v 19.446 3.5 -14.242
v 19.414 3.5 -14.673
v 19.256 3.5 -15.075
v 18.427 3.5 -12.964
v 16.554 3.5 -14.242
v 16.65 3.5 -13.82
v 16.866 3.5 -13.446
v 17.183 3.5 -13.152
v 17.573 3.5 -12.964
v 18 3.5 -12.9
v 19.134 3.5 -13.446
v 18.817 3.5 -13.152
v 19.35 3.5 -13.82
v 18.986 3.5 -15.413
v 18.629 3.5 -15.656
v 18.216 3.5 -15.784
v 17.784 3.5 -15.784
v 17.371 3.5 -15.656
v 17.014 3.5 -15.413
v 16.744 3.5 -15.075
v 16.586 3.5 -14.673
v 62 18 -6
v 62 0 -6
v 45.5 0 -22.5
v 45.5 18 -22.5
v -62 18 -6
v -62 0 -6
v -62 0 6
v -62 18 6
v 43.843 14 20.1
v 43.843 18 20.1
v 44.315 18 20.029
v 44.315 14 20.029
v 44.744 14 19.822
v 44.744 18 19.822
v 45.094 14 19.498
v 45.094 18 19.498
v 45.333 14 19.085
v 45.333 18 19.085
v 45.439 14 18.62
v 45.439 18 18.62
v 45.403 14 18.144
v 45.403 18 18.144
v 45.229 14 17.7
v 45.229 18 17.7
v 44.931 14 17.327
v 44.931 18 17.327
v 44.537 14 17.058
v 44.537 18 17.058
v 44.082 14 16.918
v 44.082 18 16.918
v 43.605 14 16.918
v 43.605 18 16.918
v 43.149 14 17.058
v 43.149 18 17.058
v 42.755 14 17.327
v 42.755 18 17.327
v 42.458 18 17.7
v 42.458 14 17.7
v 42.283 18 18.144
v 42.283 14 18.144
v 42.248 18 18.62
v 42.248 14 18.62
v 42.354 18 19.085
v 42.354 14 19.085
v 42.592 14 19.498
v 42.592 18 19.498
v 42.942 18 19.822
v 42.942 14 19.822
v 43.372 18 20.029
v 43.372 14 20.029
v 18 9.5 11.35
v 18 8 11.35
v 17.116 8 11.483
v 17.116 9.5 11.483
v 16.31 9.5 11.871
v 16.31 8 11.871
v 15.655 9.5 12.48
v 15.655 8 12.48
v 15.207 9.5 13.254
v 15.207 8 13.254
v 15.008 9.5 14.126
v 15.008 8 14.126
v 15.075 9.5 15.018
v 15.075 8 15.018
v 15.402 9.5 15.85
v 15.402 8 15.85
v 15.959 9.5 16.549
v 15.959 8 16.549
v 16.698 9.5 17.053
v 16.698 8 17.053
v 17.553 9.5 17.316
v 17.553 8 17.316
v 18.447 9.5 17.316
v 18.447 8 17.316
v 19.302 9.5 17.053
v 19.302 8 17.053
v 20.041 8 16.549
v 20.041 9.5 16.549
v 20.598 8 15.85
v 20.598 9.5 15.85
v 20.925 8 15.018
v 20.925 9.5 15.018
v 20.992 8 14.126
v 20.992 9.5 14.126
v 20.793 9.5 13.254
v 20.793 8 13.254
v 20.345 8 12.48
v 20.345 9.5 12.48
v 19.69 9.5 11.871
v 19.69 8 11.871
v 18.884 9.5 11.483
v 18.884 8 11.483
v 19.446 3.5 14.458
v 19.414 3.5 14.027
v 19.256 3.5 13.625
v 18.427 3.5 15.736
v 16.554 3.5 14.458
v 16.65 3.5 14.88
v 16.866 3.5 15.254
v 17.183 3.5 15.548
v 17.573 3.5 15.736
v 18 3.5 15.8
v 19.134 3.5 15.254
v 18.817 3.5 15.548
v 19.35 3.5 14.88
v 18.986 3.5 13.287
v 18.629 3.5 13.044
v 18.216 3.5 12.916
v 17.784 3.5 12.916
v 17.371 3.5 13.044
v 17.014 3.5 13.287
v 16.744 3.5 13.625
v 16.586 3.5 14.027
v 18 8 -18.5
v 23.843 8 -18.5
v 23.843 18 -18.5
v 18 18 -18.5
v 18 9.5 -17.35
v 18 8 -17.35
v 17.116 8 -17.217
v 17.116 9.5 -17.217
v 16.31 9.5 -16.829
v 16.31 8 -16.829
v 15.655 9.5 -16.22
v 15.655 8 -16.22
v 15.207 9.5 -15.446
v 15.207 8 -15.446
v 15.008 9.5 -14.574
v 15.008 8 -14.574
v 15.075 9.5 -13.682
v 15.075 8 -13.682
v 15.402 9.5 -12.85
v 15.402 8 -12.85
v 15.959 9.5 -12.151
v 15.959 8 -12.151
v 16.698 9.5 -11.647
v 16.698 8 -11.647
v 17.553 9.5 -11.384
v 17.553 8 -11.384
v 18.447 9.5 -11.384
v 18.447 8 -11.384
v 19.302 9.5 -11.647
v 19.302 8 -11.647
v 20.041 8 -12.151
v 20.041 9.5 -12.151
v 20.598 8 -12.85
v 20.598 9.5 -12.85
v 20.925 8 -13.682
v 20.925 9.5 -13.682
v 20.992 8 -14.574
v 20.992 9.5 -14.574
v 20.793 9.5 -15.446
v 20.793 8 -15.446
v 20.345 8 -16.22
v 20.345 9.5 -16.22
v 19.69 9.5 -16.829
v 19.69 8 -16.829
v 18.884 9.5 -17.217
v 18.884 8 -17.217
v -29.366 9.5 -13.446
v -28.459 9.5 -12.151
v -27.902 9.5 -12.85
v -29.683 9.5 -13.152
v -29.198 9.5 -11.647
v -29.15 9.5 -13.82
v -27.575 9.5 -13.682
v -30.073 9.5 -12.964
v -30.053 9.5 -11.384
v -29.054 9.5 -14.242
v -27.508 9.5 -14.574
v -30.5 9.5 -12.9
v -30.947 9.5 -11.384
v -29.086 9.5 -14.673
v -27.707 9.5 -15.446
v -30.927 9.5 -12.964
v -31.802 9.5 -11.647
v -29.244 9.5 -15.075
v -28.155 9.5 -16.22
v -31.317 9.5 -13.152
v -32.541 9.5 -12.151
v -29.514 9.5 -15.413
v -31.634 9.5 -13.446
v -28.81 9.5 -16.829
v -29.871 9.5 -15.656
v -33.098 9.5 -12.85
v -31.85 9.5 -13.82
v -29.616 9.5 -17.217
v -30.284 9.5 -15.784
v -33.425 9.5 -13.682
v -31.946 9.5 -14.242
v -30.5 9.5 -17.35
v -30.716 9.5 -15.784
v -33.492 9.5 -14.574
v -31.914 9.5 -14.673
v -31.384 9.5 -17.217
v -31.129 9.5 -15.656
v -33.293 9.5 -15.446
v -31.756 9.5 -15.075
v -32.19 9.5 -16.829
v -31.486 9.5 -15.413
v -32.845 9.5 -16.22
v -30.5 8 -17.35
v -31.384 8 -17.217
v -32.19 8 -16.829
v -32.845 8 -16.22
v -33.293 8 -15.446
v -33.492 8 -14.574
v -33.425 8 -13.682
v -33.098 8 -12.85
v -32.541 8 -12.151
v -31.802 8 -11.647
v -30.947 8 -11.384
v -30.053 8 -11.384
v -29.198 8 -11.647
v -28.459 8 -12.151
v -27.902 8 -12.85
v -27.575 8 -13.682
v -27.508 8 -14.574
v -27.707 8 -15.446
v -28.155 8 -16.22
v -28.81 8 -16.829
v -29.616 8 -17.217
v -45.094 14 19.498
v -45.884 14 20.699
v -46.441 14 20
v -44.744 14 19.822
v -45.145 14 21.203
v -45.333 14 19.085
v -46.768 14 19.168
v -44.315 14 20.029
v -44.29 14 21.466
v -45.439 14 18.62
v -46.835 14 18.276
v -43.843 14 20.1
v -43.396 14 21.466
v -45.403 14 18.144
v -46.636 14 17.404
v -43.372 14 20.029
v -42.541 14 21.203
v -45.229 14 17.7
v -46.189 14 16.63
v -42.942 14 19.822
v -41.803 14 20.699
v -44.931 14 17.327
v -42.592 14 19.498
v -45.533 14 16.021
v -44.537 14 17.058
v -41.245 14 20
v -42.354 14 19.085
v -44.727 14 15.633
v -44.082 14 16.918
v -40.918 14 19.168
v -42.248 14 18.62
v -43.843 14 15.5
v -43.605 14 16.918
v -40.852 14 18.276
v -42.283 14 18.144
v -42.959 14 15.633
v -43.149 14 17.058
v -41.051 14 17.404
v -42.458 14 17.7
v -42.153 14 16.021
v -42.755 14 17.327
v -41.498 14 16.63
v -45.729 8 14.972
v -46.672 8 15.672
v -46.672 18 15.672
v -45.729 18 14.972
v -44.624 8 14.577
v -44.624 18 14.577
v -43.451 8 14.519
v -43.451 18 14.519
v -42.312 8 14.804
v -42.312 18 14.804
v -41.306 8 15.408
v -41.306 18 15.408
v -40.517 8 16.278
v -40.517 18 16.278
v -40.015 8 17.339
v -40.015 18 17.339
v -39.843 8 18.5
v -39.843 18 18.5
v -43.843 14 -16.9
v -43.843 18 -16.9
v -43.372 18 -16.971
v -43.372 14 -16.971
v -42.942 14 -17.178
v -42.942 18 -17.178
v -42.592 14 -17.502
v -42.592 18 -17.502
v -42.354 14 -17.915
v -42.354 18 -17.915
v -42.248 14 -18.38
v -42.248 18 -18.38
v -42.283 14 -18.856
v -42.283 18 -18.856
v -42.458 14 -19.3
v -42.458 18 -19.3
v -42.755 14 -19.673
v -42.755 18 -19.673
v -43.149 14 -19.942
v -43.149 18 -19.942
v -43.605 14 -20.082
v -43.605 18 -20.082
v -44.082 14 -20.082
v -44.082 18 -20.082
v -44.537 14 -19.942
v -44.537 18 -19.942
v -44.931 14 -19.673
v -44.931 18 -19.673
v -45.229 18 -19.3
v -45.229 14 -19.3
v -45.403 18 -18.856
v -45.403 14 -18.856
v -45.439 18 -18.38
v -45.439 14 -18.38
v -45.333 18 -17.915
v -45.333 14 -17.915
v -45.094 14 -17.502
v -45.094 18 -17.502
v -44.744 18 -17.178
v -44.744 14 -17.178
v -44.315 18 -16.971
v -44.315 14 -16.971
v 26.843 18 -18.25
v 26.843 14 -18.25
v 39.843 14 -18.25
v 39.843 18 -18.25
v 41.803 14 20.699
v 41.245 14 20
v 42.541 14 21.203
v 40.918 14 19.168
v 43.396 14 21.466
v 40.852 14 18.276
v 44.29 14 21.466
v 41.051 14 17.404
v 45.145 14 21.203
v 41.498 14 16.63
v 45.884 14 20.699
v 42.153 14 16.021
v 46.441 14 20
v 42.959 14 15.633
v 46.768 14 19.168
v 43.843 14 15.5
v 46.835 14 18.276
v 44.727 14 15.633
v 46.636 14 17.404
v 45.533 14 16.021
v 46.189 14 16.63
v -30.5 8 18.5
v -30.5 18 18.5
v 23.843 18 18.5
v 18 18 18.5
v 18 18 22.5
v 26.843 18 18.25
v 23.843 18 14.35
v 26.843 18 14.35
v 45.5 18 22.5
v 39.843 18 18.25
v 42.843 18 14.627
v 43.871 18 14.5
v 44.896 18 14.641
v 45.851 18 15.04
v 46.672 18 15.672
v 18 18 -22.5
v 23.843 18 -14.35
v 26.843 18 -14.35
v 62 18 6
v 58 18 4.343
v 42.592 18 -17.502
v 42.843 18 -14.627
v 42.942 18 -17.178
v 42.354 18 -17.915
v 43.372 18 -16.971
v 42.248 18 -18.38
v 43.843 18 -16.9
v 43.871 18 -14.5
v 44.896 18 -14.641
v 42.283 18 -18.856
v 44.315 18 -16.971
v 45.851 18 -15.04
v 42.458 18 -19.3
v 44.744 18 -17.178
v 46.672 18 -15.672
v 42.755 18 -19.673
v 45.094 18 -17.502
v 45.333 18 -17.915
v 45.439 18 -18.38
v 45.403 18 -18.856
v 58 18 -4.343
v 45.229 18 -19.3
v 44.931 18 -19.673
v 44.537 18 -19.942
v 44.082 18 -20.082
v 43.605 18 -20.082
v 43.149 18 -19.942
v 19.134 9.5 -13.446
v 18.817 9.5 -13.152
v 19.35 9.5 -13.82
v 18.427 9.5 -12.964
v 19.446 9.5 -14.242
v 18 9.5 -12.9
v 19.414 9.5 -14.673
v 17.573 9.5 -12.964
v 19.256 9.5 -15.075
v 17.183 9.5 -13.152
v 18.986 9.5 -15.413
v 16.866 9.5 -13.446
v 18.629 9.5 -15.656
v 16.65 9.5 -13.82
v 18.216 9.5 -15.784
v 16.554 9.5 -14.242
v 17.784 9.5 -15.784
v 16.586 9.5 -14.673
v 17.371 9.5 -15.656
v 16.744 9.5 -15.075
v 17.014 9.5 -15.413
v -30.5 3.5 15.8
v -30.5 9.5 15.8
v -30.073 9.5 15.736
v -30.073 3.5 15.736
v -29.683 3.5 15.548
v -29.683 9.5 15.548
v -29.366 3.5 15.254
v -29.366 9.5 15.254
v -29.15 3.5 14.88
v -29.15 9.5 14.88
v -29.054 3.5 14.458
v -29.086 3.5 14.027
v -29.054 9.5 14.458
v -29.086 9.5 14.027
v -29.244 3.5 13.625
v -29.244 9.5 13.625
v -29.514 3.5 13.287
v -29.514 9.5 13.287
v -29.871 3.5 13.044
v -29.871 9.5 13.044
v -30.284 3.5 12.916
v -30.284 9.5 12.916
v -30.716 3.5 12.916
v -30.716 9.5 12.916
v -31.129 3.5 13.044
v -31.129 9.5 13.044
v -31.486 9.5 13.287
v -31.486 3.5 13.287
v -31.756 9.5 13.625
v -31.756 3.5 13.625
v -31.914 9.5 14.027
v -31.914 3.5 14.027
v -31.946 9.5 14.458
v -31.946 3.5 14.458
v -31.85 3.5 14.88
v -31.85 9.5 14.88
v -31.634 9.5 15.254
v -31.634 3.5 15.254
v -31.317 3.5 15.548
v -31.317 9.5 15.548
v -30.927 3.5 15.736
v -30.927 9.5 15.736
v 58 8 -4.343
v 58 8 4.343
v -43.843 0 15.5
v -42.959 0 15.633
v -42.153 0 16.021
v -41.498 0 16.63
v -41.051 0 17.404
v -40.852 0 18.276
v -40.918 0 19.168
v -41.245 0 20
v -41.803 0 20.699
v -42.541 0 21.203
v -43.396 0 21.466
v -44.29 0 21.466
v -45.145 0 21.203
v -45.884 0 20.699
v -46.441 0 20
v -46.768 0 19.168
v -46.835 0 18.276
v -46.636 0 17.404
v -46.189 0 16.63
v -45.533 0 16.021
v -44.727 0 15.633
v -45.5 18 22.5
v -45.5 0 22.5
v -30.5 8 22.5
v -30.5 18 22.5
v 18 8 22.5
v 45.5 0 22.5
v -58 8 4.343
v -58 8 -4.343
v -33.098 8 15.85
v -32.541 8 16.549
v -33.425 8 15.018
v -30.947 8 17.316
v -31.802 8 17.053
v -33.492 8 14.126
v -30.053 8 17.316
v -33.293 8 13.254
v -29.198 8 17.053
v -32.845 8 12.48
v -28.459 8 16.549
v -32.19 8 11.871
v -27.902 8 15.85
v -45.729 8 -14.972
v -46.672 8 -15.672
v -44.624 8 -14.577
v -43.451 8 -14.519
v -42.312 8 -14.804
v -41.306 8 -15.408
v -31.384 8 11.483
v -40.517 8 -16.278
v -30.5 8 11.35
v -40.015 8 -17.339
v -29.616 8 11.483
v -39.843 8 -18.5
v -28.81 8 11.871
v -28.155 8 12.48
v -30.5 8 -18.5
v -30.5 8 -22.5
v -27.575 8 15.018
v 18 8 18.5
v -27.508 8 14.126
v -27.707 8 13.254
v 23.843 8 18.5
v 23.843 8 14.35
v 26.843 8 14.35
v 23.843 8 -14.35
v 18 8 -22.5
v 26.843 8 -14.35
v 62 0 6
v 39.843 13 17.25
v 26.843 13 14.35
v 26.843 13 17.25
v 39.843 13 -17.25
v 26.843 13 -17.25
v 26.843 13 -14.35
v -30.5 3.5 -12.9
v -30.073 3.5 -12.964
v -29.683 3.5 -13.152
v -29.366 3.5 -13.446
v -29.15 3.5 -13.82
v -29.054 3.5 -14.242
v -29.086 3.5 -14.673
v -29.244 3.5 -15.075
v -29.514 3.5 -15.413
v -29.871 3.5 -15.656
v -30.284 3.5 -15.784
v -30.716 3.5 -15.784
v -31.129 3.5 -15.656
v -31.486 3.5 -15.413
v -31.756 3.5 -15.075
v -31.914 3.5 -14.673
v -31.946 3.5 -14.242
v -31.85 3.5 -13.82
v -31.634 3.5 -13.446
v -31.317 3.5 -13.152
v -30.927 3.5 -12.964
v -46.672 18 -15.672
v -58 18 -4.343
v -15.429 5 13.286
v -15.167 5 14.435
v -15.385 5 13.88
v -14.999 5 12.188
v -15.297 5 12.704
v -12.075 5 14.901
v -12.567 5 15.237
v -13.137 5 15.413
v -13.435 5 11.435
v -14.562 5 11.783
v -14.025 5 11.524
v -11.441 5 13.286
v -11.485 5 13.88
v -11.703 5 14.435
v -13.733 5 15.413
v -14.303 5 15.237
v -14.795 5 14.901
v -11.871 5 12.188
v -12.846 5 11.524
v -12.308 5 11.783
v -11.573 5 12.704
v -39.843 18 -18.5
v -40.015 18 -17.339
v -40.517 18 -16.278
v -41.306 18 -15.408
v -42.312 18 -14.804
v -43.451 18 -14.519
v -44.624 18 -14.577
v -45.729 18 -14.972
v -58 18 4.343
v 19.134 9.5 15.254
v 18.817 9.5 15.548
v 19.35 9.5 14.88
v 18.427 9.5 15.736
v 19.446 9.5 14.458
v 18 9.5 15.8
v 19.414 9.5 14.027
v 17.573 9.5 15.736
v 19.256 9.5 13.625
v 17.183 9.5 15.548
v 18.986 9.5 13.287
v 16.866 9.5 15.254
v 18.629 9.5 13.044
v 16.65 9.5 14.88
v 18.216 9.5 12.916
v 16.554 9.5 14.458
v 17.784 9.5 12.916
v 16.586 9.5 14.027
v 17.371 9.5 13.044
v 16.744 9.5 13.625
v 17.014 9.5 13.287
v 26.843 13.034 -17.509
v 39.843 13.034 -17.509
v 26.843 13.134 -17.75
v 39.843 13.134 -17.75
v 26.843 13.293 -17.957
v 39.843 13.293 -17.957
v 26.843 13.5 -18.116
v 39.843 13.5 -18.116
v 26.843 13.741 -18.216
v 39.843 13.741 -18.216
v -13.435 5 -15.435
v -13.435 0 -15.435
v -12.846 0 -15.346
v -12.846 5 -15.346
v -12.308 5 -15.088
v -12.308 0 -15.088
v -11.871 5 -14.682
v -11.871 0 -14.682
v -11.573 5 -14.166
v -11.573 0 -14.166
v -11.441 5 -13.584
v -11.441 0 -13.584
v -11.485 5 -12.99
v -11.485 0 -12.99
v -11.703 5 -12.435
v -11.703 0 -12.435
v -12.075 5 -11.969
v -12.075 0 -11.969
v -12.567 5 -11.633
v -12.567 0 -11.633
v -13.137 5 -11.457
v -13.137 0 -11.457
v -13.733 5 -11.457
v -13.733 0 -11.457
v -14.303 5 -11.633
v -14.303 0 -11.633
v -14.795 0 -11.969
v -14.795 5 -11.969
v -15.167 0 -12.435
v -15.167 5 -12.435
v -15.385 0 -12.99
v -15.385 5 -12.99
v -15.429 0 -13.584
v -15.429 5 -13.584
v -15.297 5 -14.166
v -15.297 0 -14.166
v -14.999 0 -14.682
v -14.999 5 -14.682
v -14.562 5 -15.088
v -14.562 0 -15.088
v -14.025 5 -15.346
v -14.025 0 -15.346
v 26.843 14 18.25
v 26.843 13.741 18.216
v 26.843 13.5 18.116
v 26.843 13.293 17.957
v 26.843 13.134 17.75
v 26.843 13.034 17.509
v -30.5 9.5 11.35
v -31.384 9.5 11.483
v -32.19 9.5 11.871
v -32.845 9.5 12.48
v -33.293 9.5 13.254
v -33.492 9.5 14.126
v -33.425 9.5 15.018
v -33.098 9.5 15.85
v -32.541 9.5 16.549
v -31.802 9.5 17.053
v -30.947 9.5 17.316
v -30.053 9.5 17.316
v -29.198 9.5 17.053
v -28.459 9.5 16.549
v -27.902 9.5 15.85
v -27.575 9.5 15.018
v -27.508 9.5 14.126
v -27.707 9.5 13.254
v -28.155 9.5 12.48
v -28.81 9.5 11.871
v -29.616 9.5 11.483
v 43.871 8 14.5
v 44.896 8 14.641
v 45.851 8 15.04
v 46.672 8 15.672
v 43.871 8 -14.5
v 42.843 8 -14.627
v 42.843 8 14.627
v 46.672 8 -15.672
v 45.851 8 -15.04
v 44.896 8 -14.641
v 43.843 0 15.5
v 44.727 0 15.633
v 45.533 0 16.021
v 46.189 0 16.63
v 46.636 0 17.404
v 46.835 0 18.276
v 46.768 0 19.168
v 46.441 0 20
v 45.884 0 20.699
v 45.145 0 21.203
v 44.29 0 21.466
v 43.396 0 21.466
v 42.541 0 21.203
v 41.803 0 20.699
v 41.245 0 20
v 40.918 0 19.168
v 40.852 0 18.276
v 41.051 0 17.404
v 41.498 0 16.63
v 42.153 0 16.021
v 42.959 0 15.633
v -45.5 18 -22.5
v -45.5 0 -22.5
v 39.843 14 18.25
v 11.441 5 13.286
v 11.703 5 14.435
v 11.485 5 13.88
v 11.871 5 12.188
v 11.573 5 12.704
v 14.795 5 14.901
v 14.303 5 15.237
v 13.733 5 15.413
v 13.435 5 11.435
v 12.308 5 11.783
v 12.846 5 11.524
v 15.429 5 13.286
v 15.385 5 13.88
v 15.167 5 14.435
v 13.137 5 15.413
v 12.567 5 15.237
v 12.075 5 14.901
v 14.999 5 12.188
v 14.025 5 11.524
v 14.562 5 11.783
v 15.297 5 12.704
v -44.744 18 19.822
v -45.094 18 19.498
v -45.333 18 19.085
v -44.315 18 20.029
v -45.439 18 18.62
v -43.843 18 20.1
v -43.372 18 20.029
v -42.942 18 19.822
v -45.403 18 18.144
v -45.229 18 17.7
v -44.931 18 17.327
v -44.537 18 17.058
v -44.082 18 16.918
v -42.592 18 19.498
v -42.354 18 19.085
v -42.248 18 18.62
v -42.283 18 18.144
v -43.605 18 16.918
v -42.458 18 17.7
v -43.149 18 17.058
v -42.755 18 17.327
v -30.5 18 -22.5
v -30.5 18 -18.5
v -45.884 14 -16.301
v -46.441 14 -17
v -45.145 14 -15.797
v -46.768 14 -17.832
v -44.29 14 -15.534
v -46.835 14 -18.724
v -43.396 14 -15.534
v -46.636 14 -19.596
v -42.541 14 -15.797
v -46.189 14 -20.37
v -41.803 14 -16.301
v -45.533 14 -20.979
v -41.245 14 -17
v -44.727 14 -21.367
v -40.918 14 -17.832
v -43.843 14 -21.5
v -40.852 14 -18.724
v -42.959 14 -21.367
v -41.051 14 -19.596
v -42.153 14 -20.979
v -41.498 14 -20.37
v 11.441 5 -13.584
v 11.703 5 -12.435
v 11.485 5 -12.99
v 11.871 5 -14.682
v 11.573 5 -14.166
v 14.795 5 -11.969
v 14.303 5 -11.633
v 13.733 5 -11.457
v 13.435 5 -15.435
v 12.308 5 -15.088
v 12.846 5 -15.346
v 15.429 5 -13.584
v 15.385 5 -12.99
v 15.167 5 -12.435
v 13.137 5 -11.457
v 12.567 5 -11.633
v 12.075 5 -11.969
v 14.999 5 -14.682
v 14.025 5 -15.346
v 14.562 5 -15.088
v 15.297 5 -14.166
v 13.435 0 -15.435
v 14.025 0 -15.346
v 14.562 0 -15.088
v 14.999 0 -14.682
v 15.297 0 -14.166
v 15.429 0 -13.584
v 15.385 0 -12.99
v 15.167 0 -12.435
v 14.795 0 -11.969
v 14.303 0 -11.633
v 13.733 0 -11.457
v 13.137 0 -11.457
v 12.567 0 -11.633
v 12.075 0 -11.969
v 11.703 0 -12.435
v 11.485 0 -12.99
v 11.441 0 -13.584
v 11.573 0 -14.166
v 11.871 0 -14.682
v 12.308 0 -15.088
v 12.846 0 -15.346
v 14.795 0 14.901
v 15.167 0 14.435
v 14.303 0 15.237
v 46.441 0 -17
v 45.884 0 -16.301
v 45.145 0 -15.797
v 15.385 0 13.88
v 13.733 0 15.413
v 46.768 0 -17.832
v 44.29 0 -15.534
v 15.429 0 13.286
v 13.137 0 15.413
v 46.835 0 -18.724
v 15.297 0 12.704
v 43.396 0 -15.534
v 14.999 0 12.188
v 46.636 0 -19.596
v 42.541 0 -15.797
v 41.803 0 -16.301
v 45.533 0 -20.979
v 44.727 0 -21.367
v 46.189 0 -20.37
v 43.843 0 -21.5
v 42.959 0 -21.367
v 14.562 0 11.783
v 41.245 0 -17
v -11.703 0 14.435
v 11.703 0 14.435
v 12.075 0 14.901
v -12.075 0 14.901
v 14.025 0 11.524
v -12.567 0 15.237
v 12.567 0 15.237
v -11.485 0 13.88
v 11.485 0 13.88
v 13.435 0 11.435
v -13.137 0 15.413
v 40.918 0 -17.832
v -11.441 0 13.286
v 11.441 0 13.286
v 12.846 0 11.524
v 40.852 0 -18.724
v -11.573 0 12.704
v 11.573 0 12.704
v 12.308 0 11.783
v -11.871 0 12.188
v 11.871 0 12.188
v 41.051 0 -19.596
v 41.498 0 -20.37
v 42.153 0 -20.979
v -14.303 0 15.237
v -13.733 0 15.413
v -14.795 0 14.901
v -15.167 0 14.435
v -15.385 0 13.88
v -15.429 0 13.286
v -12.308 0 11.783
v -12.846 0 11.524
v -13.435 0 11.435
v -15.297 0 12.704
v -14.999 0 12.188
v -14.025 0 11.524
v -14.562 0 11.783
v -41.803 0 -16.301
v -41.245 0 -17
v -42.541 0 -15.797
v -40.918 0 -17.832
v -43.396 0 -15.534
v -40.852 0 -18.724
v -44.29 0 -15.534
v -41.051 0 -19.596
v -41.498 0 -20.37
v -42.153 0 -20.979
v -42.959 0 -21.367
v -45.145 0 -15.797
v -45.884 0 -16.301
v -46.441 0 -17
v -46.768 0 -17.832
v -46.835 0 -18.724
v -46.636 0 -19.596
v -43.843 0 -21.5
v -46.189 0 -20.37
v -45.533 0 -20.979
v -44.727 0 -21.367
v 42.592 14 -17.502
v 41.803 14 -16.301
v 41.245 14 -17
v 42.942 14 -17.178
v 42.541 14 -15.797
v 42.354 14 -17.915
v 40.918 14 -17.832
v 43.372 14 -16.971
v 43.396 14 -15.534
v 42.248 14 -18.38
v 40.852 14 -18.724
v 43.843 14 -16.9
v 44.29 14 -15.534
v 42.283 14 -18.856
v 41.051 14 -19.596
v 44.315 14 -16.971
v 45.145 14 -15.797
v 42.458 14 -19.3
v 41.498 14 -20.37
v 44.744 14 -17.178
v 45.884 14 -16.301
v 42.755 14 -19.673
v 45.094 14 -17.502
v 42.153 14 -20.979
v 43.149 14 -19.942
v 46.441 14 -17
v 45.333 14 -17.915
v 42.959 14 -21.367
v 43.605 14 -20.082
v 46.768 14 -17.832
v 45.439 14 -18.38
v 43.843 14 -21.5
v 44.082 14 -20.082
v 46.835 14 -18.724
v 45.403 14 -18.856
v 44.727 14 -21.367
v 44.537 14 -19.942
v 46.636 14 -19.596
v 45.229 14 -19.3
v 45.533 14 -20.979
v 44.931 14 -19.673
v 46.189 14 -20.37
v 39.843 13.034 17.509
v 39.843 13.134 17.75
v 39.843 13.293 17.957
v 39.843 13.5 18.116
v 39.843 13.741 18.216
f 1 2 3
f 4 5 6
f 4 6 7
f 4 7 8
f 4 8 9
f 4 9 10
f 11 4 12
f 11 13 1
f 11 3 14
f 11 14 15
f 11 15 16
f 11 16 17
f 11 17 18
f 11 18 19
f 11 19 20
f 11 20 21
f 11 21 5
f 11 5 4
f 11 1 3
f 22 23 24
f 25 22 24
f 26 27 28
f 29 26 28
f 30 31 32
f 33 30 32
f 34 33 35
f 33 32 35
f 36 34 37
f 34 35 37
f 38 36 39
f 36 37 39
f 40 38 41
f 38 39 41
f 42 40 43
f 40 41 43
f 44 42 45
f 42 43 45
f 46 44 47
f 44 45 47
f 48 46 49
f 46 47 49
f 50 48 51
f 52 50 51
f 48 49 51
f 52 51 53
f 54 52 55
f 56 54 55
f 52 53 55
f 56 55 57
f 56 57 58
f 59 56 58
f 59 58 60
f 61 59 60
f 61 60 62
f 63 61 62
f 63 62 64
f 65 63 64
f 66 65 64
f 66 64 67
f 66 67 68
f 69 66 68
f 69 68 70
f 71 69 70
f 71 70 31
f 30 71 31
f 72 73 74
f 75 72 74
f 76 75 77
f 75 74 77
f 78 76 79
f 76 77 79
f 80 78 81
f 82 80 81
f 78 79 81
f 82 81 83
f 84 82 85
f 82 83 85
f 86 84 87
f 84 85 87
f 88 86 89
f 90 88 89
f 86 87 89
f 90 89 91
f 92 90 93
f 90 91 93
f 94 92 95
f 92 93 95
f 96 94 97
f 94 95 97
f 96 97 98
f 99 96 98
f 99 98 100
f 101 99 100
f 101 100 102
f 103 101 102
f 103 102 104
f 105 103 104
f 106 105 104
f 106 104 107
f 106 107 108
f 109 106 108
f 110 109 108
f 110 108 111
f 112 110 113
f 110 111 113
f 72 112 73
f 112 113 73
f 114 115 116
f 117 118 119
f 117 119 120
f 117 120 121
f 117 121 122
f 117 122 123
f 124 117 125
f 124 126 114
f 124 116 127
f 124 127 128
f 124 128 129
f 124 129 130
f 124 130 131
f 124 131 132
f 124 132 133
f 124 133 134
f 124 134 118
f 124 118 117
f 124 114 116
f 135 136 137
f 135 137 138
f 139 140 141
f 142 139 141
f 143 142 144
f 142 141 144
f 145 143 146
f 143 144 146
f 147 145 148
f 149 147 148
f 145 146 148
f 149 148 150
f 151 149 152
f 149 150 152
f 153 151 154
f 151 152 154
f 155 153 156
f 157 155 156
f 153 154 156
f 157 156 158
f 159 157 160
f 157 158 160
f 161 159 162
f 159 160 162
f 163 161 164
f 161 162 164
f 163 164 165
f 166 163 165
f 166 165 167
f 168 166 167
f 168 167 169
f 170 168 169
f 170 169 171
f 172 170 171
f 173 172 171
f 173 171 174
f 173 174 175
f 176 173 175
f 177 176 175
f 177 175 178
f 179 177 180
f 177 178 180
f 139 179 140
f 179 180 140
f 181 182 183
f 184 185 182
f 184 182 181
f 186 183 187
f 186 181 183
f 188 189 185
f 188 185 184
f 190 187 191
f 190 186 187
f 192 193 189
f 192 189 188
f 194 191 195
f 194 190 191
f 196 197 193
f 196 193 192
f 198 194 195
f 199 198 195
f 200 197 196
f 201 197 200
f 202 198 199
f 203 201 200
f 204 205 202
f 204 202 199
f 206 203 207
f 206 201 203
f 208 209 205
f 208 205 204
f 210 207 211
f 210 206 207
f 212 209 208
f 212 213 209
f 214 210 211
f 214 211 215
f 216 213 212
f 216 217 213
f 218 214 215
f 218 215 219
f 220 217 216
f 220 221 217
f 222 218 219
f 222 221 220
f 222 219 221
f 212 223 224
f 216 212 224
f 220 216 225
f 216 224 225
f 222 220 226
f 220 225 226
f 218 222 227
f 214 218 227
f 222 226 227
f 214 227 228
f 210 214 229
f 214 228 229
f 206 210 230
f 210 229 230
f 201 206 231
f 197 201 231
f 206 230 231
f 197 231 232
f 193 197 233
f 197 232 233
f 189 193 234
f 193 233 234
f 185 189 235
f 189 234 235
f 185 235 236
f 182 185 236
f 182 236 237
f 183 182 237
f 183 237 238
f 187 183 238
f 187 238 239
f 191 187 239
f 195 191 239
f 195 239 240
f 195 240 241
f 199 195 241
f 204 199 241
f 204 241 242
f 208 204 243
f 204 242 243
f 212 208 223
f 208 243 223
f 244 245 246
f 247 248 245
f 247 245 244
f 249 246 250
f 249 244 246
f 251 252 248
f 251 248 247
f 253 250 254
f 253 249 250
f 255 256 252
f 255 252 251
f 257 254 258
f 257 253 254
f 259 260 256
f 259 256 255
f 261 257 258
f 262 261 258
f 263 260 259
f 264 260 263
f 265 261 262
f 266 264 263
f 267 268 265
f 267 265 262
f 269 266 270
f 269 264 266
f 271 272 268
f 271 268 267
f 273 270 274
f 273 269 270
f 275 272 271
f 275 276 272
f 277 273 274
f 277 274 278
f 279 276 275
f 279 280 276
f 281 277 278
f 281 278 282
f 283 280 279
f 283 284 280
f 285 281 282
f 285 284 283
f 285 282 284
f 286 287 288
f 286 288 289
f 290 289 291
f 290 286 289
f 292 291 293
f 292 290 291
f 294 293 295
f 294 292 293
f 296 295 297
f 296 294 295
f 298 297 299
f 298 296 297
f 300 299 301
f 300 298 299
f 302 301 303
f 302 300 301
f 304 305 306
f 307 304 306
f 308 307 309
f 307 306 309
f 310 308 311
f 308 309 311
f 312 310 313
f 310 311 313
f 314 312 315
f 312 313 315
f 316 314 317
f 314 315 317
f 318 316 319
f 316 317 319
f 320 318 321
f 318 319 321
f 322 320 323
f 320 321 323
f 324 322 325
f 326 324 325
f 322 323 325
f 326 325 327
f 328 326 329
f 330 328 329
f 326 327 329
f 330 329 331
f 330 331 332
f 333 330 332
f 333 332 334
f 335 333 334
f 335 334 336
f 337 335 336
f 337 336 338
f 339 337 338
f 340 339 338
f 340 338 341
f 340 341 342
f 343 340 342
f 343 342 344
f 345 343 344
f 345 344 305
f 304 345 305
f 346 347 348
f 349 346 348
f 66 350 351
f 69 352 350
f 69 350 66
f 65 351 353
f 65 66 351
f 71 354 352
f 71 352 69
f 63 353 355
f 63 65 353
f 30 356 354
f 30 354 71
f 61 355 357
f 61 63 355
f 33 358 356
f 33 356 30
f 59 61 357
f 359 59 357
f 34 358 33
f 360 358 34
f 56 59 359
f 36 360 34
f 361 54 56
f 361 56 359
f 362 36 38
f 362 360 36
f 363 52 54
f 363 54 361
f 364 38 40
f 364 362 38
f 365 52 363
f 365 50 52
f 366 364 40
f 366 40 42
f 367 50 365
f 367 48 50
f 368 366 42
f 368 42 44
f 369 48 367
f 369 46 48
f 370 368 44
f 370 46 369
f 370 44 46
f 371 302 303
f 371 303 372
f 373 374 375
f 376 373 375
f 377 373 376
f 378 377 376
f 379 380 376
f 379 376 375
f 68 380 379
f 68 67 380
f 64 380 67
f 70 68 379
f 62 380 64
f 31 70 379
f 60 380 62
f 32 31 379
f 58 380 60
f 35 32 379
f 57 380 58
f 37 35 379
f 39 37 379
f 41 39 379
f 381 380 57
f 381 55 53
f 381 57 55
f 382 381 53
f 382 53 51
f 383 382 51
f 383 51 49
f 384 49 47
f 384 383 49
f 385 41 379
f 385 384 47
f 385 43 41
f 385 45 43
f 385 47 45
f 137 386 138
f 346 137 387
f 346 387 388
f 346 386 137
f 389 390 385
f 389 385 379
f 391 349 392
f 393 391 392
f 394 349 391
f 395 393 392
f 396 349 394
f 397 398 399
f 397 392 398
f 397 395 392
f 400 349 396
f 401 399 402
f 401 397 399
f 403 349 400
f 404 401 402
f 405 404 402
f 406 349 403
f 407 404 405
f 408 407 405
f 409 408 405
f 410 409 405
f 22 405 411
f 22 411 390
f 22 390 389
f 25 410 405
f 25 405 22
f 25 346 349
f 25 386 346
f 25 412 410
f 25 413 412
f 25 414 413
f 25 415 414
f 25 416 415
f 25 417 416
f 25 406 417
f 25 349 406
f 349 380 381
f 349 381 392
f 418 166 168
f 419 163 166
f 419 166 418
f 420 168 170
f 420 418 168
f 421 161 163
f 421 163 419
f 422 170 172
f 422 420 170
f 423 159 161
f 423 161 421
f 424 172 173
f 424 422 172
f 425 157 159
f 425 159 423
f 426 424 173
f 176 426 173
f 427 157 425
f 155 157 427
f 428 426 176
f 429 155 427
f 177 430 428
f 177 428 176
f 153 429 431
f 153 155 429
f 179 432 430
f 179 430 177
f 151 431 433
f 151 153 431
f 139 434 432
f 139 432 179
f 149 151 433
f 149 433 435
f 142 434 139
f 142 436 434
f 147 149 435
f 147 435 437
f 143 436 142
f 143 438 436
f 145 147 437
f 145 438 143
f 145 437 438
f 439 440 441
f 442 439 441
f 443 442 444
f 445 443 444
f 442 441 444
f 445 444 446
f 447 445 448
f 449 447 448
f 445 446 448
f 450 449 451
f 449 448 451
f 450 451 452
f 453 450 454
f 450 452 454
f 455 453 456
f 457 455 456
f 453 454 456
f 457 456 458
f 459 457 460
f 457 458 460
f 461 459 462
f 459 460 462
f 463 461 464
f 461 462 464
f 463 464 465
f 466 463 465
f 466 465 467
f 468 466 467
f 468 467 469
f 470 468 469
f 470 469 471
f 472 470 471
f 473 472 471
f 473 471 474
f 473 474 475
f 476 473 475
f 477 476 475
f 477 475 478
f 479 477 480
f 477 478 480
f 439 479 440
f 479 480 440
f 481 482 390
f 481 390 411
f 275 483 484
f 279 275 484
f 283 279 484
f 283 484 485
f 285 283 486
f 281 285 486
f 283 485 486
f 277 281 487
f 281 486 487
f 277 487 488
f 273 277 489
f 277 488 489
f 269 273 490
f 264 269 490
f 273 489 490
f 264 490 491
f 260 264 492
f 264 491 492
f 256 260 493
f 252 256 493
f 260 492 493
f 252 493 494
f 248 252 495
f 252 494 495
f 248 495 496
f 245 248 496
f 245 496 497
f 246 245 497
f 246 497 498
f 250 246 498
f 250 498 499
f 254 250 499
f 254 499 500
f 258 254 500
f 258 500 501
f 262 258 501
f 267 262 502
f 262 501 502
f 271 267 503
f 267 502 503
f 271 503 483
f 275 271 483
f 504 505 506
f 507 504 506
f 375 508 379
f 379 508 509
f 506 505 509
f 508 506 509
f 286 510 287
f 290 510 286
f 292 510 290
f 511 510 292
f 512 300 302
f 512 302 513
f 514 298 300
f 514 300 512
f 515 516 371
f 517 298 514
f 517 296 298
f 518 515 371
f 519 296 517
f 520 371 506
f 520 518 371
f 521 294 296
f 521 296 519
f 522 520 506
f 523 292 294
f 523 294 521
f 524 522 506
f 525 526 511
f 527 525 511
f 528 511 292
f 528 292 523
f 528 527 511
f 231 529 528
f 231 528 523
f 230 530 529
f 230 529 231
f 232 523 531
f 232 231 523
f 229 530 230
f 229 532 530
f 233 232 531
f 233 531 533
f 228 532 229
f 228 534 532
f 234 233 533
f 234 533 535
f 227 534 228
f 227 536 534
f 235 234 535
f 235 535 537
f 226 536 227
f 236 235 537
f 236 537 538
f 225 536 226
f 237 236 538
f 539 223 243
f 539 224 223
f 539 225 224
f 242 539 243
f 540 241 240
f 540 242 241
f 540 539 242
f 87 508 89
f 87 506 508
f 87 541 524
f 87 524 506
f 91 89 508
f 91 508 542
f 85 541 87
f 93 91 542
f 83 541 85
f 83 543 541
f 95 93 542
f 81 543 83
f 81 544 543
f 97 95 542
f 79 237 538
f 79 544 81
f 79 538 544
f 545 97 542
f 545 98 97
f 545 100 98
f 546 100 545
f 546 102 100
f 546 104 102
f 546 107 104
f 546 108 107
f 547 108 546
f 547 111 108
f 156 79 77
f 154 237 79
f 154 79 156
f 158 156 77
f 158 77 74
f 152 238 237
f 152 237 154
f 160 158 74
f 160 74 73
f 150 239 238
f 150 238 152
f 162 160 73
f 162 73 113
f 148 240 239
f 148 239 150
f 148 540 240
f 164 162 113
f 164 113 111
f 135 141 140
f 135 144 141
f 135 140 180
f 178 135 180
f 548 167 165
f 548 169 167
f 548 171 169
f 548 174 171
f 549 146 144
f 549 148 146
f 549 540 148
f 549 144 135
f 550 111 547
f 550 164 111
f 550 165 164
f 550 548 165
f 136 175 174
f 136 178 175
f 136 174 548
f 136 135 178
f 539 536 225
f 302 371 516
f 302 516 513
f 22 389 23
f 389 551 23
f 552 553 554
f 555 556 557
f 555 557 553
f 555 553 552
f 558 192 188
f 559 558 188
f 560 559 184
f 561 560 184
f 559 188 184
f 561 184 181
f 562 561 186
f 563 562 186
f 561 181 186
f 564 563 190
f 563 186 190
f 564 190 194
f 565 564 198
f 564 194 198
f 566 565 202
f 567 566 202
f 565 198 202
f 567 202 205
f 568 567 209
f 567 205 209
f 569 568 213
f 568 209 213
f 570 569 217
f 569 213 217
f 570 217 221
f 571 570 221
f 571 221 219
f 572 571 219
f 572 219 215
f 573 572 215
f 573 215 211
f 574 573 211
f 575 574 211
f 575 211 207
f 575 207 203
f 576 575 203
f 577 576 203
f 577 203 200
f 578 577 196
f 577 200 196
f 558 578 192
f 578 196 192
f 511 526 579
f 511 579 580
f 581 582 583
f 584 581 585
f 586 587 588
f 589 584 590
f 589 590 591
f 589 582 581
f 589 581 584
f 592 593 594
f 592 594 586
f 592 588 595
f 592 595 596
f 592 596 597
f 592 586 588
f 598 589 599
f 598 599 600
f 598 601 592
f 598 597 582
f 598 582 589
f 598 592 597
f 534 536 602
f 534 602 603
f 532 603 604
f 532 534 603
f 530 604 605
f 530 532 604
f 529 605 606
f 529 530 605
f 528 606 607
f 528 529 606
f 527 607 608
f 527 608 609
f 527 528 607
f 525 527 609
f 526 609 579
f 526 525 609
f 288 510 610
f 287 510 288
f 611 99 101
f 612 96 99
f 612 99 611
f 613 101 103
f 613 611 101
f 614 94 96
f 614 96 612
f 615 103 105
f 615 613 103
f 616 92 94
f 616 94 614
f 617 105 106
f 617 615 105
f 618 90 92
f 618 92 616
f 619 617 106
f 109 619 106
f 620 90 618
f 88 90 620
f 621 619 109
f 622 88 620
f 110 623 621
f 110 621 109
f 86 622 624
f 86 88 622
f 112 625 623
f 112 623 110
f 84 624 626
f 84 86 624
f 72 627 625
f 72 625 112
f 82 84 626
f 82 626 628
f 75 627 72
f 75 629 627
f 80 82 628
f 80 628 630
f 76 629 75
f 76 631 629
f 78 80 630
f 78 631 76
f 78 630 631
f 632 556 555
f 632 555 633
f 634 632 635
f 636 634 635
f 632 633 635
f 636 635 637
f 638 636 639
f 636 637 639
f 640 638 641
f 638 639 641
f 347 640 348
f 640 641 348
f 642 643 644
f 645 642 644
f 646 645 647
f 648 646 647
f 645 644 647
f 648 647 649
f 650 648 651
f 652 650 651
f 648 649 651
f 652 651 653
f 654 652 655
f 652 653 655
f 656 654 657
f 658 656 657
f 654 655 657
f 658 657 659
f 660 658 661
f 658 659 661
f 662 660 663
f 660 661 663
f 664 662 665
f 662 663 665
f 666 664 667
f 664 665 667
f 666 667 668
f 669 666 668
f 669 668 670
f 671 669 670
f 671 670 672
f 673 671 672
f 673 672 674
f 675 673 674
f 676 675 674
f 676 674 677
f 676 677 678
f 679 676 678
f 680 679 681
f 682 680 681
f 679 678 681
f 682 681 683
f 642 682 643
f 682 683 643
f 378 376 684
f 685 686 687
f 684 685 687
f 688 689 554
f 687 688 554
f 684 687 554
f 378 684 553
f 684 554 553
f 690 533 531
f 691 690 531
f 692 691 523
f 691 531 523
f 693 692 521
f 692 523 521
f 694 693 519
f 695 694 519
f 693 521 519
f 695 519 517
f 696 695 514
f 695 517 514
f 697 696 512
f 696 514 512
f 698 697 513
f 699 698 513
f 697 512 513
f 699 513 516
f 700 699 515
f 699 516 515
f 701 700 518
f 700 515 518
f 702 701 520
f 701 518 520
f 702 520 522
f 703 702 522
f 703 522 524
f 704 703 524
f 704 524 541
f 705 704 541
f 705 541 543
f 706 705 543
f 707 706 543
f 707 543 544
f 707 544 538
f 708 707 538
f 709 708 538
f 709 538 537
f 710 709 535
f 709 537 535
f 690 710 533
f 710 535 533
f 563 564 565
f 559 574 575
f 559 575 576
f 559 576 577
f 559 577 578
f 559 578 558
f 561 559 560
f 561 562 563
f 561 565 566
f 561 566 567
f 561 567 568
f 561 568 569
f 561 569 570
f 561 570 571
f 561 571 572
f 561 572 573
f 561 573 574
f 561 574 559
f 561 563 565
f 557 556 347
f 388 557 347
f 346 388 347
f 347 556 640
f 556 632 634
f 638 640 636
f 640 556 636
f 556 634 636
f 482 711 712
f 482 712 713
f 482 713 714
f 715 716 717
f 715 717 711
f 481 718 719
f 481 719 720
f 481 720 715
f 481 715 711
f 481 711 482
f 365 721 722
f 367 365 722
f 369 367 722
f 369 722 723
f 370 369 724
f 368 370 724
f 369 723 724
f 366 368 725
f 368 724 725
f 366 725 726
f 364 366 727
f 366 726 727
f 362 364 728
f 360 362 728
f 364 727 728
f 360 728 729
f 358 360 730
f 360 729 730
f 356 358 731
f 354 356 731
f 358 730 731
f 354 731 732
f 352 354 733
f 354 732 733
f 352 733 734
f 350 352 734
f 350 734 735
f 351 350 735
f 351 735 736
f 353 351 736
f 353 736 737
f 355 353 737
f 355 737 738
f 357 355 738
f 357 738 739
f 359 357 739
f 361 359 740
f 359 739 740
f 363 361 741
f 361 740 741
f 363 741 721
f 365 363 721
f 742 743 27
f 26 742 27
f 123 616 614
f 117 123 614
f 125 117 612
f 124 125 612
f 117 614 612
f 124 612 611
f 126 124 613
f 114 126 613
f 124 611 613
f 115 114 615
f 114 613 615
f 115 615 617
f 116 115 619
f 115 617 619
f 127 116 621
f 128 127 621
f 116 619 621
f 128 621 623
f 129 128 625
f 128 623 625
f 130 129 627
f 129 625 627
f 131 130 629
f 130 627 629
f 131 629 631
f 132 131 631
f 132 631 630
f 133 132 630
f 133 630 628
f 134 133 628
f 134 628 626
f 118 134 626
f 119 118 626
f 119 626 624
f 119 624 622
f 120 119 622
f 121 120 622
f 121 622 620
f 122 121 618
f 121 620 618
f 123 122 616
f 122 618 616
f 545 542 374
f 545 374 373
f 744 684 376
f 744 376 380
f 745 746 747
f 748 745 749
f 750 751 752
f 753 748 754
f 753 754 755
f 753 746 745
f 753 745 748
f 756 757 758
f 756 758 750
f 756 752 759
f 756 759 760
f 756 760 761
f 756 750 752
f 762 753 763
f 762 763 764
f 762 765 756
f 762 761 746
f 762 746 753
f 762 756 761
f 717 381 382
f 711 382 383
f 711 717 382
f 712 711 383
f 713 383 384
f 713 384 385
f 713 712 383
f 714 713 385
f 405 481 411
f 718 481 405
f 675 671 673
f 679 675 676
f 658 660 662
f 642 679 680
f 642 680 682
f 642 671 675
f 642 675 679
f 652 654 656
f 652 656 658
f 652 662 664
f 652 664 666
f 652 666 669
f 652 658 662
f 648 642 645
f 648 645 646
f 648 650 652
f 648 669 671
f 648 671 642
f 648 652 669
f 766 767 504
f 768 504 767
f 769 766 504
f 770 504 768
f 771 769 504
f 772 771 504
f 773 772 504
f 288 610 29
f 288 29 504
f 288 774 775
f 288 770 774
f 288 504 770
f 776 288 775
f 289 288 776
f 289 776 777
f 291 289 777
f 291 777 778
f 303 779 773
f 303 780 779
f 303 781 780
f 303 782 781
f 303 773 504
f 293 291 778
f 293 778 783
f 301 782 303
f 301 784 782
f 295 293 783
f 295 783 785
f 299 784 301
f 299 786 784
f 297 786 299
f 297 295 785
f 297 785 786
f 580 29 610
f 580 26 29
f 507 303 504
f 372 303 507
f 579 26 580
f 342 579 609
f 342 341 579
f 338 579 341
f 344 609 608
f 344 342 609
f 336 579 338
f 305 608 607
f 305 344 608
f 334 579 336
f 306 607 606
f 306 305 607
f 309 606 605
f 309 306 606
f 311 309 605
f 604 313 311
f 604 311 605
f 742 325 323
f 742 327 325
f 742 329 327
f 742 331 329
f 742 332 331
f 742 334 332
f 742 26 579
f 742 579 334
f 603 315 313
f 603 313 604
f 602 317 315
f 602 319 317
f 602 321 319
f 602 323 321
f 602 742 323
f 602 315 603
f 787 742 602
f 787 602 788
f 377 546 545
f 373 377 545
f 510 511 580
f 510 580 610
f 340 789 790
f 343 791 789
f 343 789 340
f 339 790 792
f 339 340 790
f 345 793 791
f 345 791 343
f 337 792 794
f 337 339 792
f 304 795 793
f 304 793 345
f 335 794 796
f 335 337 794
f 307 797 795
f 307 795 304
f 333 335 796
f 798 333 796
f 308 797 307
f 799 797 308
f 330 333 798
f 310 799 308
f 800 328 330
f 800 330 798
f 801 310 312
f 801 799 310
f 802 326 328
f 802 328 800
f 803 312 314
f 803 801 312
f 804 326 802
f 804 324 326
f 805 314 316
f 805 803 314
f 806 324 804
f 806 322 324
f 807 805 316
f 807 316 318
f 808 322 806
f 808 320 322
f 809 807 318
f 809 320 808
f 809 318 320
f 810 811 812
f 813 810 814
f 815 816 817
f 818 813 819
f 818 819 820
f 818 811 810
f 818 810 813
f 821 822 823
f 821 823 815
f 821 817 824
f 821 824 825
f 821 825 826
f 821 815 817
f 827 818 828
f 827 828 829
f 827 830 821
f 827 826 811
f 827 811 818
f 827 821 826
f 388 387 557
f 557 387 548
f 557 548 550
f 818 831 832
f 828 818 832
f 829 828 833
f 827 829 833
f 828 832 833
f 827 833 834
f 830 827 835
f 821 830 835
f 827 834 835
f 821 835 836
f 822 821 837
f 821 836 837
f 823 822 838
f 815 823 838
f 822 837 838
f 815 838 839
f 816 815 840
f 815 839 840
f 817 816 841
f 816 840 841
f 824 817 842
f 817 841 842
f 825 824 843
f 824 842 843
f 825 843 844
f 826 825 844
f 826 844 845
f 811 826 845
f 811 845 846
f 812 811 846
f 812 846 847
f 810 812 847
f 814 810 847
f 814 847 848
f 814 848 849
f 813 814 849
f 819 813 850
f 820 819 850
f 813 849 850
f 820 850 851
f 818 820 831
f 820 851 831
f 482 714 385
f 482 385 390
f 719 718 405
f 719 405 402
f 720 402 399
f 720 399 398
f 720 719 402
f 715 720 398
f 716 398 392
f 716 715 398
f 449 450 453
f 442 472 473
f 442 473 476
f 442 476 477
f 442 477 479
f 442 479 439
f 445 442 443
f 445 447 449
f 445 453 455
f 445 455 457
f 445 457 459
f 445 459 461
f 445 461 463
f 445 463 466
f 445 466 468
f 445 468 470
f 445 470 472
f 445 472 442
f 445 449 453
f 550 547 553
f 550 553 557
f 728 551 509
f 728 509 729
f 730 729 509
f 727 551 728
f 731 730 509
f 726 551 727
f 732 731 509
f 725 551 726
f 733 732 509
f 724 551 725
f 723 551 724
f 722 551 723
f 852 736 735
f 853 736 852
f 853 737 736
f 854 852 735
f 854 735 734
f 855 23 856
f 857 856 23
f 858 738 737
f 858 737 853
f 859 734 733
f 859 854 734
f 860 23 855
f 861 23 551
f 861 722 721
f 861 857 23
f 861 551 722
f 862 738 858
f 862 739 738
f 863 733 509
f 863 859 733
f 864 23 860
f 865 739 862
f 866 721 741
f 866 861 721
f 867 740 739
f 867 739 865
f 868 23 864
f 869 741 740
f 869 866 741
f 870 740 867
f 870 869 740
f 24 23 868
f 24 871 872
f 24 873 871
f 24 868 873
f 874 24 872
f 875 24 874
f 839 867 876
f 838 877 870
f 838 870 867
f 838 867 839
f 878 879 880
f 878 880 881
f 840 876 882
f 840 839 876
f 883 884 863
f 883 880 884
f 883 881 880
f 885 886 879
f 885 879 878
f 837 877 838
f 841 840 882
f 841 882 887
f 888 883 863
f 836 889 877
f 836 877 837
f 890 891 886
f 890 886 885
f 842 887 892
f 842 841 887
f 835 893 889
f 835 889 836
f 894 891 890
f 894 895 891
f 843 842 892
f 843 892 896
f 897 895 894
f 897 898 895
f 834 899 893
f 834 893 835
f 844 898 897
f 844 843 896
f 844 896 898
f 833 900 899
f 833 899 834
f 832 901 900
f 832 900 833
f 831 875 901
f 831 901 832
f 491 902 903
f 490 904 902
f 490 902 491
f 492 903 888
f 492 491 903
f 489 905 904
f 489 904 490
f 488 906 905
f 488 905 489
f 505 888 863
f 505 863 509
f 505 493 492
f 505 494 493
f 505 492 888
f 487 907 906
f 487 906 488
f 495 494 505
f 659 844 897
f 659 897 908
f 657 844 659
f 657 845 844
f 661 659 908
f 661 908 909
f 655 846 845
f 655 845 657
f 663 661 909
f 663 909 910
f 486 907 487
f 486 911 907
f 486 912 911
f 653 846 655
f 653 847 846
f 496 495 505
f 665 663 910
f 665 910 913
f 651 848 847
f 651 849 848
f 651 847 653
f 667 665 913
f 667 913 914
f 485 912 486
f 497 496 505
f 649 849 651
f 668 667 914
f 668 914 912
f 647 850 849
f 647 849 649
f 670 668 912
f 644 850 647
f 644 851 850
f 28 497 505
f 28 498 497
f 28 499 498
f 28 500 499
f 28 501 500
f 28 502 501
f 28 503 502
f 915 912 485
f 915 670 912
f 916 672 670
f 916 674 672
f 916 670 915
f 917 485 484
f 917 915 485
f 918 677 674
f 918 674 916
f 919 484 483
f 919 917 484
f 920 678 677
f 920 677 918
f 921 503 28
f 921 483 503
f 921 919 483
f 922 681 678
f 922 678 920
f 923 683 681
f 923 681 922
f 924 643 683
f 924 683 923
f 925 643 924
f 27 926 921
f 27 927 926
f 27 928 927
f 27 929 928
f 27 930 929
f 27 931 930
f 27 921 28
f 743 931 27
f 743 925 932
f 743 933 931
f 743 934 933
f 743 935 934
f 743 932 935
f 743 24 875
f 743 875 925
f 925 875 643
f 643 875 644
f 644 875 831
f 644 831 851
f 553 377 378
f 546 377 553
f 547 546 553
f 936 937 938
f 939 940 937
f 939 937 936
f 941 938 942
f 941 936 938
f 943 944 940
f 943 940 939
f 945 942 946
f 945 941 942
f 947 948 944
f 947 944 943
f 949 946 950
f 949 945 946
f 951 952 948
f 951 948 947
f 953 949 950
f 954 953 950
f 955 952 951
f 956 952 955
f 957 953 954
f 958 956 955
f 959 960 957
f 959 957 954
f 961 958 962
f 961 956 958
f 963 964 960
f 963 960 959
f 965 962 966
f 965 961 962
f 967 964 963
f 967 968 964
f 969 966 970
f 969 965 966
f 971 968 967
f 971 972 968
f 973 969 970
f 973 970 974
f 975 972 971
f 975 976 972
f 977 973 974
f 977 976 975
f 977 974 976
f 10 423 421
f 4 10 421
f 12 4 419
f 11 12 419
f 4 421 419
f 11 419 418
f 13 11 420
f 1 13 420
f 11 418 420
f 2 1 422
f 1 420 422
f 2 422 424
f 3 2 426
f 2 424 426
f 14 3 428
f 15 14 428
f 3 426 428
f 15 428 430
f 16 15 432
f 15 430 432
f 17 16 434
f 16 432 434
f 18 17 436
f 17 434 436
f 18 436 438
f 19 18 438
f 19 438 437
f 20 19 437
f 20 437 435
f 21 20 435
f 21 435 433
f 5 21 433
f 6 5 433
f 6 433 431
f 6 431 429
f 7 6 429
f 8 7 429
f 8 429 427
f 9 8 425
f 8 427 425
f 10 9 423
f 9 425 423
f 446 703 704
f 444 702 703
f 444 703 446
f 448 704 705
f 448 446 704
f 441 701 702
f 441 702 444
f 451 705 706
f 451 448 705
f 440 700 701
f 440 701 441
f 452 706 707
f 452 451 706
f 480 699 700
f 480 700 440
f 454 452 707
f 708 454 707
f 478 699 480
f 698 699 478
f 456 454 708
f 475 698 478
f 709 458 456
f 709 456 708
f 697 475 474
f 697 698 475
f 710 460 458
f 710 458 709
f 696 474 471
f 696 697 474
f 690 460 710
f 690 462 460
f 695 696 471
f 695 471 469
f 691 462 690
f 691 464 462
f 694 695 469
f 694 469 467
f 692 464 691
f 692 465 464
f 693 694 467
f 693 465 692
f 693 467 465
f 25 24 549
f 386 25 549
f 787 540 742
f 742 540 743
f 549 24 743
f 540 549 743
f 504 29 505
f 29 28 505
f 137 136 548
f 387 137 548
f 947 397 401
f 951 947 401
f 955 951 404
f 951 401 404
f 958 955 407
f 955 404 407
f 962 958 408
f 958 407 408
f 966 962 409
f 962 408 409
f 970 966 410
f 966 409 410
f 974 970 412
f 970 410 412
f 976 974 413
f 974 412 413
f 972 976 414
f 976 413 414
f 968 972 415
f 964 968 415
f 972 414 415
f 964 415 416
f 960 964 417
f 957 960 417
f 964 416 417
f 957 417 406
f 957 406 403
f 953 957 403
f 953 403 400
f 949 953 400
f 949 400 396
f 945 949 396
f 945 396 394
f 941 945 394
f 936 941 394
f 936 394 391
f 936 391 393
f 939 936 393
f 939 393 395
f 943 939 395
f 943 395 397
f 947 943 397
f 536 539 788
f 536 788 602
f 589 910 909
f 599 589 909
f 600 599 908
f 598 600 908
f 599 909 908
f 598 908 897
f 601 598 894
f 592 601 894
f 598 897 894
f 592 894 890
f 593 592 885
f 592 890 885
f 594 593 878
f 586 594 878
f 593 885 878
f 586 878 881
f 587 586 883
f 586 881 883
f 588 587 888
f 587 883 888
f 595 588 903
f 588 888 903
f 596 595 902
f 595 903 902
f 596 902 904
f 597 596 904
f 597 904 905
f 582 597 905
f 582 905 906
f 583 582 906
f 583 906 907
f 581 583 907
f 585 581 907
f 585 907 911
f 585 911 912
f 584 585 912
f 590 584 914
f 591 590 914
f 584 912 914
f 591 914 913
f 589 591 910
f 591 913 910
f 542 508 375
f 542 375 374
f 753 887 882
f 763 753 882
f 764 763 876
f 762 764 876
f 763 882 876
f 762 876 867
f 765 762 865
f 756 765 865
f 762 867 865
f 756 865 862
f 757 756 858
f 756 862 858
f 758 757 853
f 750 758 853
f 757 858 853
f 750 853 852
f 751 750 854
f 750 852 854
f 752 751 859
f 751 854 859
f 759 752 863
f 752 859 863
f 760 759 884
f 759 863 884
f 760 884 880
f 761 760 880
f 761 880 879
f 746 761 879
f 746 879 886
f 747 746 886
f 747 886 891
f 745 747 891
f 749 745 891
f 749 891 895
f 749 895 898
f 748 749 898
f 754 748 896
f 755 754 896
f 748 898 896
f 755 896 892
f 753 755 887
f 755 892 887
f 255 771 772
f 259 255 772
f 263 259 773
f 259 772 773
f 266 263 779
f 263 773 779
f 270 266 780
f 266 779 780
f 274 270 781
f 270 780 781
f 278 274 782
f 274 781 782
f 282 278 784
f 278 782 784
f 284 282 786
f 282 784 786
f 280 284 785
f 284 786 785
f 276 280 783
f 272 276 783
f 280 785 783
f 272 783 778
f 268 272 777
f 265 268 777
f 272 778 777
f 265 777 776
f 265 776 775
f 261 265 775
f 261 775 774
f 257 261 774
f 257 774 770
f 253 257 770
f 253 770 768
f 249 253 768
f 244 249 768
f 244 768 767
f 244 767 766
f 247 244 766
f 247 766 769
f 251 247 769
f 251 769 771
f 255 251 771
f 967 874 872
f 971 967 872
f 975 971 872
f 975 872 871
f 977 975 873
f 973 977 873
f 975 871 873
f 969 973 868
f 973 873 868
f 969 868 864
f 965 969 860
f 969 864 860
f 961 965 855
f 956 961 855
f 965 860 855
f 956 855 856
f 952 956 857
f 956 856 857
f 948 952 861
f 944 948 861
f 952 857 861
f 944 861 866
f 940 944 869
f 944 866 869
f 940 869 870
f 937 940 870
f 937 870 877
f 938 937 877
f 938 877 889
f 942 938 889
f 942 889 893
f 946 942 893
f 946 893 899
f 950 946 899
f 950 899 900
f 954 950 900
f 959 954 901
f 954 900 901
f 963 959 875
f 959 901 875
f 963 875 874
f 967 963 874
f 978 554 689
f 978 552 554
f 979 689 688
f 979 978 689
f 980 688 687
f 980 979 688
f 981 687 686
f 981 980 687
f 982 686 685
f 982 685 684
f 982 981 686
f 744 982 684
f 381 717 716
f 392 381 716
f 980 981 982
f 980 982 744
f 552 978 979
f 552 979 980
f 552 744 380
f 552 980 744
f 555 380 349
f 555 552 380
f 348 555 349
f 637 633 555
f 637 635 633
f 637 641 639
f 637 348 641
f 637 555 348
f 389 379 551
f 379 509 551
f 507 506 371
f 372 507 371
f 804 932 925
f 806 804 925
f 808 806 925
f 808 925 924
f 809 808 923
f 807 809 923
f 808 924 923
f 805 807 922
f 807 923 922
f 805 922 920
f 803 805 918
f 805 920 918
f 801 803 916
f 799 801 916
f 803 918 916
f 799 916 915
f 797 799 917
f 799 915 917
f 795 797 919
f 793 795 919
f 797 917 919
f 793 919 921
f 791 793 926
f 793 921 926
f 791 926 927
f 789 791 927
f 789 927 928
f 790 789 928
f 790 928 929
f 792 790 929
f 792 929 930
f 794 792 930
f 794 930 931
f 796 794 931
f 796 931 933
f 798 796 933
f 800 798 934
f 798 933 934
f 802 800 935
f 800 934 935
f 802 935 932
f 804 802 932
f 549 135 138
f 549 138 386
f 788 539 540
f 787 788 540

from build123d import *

# Parameters (mm, degrees)
BOSS_EXTRUDE1_DEPTH = 8
BOSS_EXTRUDE2_DEPTH = 10
SKETCH6_R           = 3
BOSS_EXTRUDE3_DEPTH = 1.5
SKETCH7_W           = 48.5
SKETCH7_H           = 4
CUT_EXTRUDE3_DEPTH  = 67.710194124
SKETCH8_W           = 13
SKETCH8_H           = 36.5
BOSS_EXTRUDE4_DEPTH = 10
SKETCH9_W           = 3
SKETCH9_H           = 28.7
CUT_EXTRUDE4_DEPTH  = 67.710194124
SKETCH10_R          = 1.6
CUT_EXTRUDE5_DEPTH  = 69.368486893
SKETCH11_R          = 3
CUT_EXTRUDE6_DEPTH  = 14
SKETCH12_R          = 1.45
CUT_EXTRUDE7_DEPTH  = 6
SKETCH13_W          = 13
SKETCH13_H          = 36.5
BOSS_EXTRUDE5_DEPTH = 5
SKETCH14_R          = 2
CUT_EXTRUDE8_DEPTH  = 5
FILLET1_R           = 1


with BuildPart() as part:
    # Sketch2 → Boss-Extrude1 (new body)
    with BuildSketch(Plane(origin=(0, 0, 0), x_dir=(1, 0, 0), z_dir=(0, 1, 0))):
        Polygon((-62, 6), (-45.5, 22.5), (45.5, 22.5), (62, 6), (62, -6), (45.5, -22.5), (-45.5, -22.5), (-62, -6), align=None)
    extrude(amount=BOSS_EXTRUDE1_DEPTH)

    # Sketch5 → Boss-Extrude2 (add)
    with BuildSketch(Plane(origin=(0, 8, 0), x_dir=(1, 0, 0), z_dir=(0, 1, 0))):
        Polygon((-62, 6), (-62, -6), (-45.5, -22.5), (45.5, -22.5), (62, -6), (62, 6), (45.5, 22.5), (-45.5, 22.5), align=None)
        with BuildLine():
            Line((-58, 4.343145751), (-58, -4.343145751))
            Line((-58, -4.343145751), (-46.671572875, -15.671572875))
            ThreePointArc((-46.671572875, -15.671572875), (-42.312412021, -14.80448187), (-39.843145751, -18.5))
            Line((-39.843145751, -18.5), (39.843145751, -18.5))
            ThreePointArc((39.843145751, -18.5), (42.312412021, -14.80448187), (46.671572875, -15.671572875))
            Line((46.671572875, -15.671572875), (58, -4.343145751))
            Line((58, -4.343145751), (58, 4.343145751))
            Line((58, 4.343145751), (46.671572875, 15.671572875))
            ThreePointArc((46.671572875, 15.671572875), (42.312412021, 14.80448187), (39.843145751, 18.5))
            Line((39.843145751, 18.5), (-39.843145751, 18.5))
            ThreePointArc((-39.843145751, 18.5), (-42.312412021, 14.80448187), (-46.671572875, 15.671572875))
            Line((-46.671572875, 15.671572875), (-58, 4.343145751))
        make_face(mode=Mode.SUBTRACT)
    extrude(amount=BOSS_EXTRUDE2_DEPTH)

    # Sketch6 → Boss-Extrude3 (add)
    with BuildSketch(Plane(origin=(0, 8, 0), x_dir=(1, 0, 0), z_dir=(0, 1, 0))):
        with Locations(Location((18, 14.35, 0), (0, 0, 90))):
            Circle(SKETCH6_R)
        with Locations(Location((-30.5, 14.35, 0), (0, 0, 90))):
            Circle(SKETCH6_R)
        with Locations(Location((-30.5, -14.35, 0), (0, 0, 90))):
            Circle(SKETCH6_R)
        with Locations(Location((18, -14.35, 0), (0, 0, 90))):
            Circle(SKETCH6_R)
    extrude(amount=BOSS_EXTRUDE3_DEPTH)

    # Sketch7 → Cut-Extrude3 (cut, through all)
    with BuildSketch(Plane(origin=(0, 8, 0), x_dir=(1, 0, 0), z_dir=(0, 1, 0))):
        with Locations((-6.25, 20.5)):
            Rectangle(SKETCH7_W, SKETCH7_H)
        with Locations((-6.25, -20.5)):
            Rectangle(SKETCH7_W, SKETCH7_H)
    extrude(amount=CUT_EXTRUDE3_DEPTH, mode=Mode.SUBTRACT)

    # Sketch8 → Boss-Extrude4 (add, through all)
    with BuildSketch(Plane(origin=(0, 8, 0), x_dir=(1, 0, 0), z_dir=(0, 1, 0))):
        with BuildLine():
            Line((23.843145751, 18.5), (23.843145751, -18.5))
            Line((23.843145751, -18.5), (39.843145751, -18.5))
            ThreePointArc((39.843145751, -18.5), (40.68086809, -16.050510257), (42.843145751, -14.627016654))
            Line((42.843145751, -14.627016654), (42.843145751, 14.627016654))
            ThreePointArc((42.843145751, 14.627016654), (40.68086809, 16.050510257), (39.843145751, 18.5))
            Line((39.843145751, 18.5), (23.843145751, 18.5))
        make_face()
        with Locations((33.343145751, 0)):
            Rectangle(SKETCH8_W, SKETCH8_H, mode=Mode.SUBTRACT)
    extrude(amount=BOSS_EXTRUDE4_DEPTH)

    # Sketch9 → Cut-Extrude4 (cut, through all)
    with BuildSketch(Plane(origin=(0, 8, 0), x_dir=(1, 0, 0), z_dir=(0, 1, 0))):
        with Locations((25.343145751, 0)):
            Rectangle(SKETCH9_W, SKETCH9_H)
    extrude(amount=CUT_EXTRUDE4_DEPTH, mode=Mode.SUBTRACT)

    # Sketch10 → Cut-Extrude5 (cut, through all)
    with BuildSketch(Plane(origin=(0, 18, 0), x_dir=(1, 0, 0), z_dir=(0, 1, 0))):
        with Locations(Location((-43.843145751, 18.5, 0), (0, 0, 270))):
            Circle(SKETCH10_R)
        with Locations(Location((43.843145751, 18.5, 0), (0, 0, 270))):
            Circle(SKETCH10_R)
        with Locations(Location((43.843145751, -18.5, 0), (0, 0, 270))):
            Circle(SKETCH10_R)
        with Locations(Location((-43.843145751, -18.5, 0), (0, 0, 270))):
            Circle(SKETCH10_R)
    extrude(amount=-CUT_EXTRUDE5_DEPTH, mode=Mode.SUBTRACT)

    # Sketch11 → Cut-Extrude6 (cut)
    with BuildSketch(Plane.XZ):
        with Locations(Location((-43.843145751, 18.5, 0), (0, 0, 270))):
            Circle(SKETCH11_R)
        with Locations(Location((43.843145751, 18.5, 0), (0, 0, 270))):
            Circle(SKETCH11_R)
        with Locations(Location((43.843145751, -18.5, 0), (0, 0, 270))):
            Circle(SKETCH11_R)
        with Locations(Location((-43.843145751, -18.5, 0), (0, 0, 270))):
            Circle(SKETCH11_R)
    extrude(amount=-CUT_EXTRUDE6_DEPTH, mode=Mode.SUBTRACT)

    # Sketch12 → Cut-Extrude7 (cut)
    with BuildSketch(Plane(origin=(0, 9.5, 0), x_dir=(1, 0, 0), z_dir=(0, 1, 0))):
        with Locations(Location((-30.5, 14.35, 0), (0, 0, 270))):
            Circle(SKETCH12_R)
        with Locations(Location((18, 14.35, 0), (0, 0, 270))):
            Circle(SKETCH12_R)
        with Locations(Location((18, -14.35, 0), (0, 0, 270))):
            Circle(SKETCH12_R)
        with Locations(Location((-30.5, -14.35, 0), (0, 0, 270))):
            Circle(SKETCH12_R)
    extrude(amount=-CUT_EXTRUDE7_DEPTH, mode=Mode.SUBTRACT)

    # Sketch13 → Boss-Extrude5 (add)
    with BuildSketch(Plane(origin=(0, 8, 0), x_dir=(1, 0, 0), z_dir=(0, 1, 0))):
        with Locations((33.343145751, 0)):
            Rectangle(SKETCH13_W, SKETCH13_H)
    extrude(amount=BOSS_EXTRUDE5_DEPTH)

    # Sketch14 → Cut-Extrude8 (cut)
    with BuildSketch(Plane.XZ):
        with Locations(Location((-13.435028843, 13.435028843, 0), (0, 0, 270))):
            Circle(SKETCH14_R)
        with Locations(Location((13.435028843, 13.435028843, 0), (0, 0, 270))):
            Circle(SKETCH14_R)
        with Locations(Location((13.435028843, -13.435028843, 0), (0, 0, 270))):
            Circle(SKETCH14_R)
        with Locations(Location((-13.435028843, -13.435028843, 0), (0, 0, 270))):
            Circle(SKETCH14_R)
    extrude(amount=-CUT_EXTRUDE8_DEPTH, mode=Mode.SUBTRACT)

    # Fillet1
    fillet1_edges = [part.edges().sort_by_distance(p)[0] for p in [
        (33.343145751, 13, -18.25),
        (33.343145751, 13, 18.25),
    ]]
    fillet(fillet1_edges, radius=FILLET1_R)


solid = part.part
